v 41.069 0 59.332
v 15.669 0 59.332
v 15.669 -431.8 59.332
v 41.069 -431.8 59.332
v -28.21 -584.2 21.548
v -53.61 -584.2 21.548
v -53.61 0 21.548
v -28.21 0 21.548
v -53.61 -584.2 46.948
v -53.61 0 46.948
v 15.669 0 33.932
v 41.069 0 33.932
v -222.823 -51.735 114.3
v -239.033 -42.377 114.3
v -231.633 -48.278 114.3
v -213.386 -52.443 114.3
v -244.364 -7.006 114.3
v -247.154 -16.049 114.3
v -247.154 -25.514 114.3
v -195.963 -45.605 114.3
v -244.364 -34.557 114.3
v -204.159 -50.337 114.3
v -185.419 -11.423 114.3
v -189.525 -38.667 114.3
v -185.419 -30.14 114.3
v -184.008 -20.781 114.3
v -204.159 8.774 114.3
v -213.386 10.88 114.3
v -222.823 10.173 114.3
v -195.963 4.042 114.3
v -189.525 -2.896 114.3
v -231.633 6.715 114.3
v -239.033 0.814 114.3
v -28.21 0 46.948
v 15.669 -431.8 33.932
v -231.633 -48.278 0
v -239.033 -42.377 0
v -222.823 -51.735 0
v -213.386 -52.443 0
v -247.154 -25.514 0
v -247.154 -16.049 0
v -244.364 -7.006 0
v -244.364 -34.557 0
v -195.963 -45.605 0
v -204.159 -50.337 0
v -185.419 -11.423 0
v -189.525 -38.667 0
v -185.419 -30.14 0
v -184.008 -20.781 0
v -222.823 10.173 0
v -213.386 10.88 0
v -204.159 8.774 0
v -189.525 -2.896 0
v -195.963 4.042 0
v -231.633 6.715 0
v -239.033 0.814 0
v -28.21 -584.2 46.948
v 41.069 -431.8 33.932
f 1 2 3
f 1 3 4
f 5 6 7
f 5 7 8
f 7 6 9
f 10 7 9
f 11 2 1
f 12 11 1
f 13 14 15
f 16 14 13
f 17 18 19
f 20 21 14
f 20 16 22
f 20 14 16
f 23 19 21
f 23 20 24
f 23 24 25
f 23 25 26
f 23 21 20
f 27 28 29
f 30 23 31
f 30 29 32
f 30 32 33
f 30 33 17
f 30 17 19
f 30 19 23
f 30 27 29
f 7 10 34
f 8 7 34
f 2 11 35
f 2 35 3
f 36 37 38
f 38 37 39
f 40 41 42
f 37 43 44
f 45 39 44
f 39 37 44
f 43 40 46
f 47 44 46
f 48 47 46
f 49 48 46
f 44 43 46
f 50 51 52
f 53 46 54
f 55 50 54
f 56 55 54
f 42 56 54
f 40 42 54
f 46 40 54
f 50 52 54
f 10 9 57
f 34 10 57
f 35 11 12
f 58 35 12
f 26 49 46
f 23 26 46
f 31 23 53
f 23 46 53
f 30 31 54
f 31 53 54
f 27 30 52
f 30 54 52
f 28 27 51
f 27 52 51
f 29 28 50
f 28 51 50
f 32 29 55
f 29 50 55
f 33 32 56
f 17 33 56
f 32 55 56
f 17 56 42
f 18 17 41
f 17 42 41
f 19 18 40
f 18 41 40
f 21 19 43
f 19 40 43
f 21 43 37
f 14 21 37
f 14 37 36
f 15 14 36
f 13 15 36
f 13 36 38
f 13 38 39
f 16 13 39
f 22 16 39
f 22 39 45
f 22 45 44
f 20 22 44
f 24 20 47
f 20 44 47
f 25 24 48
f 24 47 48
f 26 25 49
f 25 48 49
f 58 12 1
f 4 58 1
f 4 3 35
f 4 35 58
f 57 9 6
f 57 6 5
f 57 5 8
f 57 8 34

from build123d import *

# Parameters (mm, degrees)
F0_W     = 25.4
F0_H     = 25.4
F1_DEPTH = 584.2
F2_W     = 25.4
F2_H     = 25.4
F3_DEPTH = 431.8
F4_R     = 31.75
F5_DEPTH = 114.3


with BuildPart() as f1:
    # F0 (on Front) → F1 (new body)
    with BuildSketch(Plane.XZ):
        with Locations((-40.909534, 34.247813)):
            Rectangle(F0_W, F0_H)
    extrude(amount=F1_DEPTH)


with BuildPart() as f3:
    # F2 (on Front) → F3 (new body)
    with BuildSketch(Plane.XZ):
        with Locations((28.369295, 46.632254)):
            Rectangle(F2_W, F2_H)
    extrude(amount=F3_DEPTH)


with BuildPart() as f5:
    # F4 (on Top) → F5 (new body)
    with BuildSketch(Plane.XY):
        with Locations((-215.758383, -20.781416)):
            Circle(F4_R)
    extrude(amount=F5_DEPTH)


solid = Compound([f1.part, f3.part, f5.part])
